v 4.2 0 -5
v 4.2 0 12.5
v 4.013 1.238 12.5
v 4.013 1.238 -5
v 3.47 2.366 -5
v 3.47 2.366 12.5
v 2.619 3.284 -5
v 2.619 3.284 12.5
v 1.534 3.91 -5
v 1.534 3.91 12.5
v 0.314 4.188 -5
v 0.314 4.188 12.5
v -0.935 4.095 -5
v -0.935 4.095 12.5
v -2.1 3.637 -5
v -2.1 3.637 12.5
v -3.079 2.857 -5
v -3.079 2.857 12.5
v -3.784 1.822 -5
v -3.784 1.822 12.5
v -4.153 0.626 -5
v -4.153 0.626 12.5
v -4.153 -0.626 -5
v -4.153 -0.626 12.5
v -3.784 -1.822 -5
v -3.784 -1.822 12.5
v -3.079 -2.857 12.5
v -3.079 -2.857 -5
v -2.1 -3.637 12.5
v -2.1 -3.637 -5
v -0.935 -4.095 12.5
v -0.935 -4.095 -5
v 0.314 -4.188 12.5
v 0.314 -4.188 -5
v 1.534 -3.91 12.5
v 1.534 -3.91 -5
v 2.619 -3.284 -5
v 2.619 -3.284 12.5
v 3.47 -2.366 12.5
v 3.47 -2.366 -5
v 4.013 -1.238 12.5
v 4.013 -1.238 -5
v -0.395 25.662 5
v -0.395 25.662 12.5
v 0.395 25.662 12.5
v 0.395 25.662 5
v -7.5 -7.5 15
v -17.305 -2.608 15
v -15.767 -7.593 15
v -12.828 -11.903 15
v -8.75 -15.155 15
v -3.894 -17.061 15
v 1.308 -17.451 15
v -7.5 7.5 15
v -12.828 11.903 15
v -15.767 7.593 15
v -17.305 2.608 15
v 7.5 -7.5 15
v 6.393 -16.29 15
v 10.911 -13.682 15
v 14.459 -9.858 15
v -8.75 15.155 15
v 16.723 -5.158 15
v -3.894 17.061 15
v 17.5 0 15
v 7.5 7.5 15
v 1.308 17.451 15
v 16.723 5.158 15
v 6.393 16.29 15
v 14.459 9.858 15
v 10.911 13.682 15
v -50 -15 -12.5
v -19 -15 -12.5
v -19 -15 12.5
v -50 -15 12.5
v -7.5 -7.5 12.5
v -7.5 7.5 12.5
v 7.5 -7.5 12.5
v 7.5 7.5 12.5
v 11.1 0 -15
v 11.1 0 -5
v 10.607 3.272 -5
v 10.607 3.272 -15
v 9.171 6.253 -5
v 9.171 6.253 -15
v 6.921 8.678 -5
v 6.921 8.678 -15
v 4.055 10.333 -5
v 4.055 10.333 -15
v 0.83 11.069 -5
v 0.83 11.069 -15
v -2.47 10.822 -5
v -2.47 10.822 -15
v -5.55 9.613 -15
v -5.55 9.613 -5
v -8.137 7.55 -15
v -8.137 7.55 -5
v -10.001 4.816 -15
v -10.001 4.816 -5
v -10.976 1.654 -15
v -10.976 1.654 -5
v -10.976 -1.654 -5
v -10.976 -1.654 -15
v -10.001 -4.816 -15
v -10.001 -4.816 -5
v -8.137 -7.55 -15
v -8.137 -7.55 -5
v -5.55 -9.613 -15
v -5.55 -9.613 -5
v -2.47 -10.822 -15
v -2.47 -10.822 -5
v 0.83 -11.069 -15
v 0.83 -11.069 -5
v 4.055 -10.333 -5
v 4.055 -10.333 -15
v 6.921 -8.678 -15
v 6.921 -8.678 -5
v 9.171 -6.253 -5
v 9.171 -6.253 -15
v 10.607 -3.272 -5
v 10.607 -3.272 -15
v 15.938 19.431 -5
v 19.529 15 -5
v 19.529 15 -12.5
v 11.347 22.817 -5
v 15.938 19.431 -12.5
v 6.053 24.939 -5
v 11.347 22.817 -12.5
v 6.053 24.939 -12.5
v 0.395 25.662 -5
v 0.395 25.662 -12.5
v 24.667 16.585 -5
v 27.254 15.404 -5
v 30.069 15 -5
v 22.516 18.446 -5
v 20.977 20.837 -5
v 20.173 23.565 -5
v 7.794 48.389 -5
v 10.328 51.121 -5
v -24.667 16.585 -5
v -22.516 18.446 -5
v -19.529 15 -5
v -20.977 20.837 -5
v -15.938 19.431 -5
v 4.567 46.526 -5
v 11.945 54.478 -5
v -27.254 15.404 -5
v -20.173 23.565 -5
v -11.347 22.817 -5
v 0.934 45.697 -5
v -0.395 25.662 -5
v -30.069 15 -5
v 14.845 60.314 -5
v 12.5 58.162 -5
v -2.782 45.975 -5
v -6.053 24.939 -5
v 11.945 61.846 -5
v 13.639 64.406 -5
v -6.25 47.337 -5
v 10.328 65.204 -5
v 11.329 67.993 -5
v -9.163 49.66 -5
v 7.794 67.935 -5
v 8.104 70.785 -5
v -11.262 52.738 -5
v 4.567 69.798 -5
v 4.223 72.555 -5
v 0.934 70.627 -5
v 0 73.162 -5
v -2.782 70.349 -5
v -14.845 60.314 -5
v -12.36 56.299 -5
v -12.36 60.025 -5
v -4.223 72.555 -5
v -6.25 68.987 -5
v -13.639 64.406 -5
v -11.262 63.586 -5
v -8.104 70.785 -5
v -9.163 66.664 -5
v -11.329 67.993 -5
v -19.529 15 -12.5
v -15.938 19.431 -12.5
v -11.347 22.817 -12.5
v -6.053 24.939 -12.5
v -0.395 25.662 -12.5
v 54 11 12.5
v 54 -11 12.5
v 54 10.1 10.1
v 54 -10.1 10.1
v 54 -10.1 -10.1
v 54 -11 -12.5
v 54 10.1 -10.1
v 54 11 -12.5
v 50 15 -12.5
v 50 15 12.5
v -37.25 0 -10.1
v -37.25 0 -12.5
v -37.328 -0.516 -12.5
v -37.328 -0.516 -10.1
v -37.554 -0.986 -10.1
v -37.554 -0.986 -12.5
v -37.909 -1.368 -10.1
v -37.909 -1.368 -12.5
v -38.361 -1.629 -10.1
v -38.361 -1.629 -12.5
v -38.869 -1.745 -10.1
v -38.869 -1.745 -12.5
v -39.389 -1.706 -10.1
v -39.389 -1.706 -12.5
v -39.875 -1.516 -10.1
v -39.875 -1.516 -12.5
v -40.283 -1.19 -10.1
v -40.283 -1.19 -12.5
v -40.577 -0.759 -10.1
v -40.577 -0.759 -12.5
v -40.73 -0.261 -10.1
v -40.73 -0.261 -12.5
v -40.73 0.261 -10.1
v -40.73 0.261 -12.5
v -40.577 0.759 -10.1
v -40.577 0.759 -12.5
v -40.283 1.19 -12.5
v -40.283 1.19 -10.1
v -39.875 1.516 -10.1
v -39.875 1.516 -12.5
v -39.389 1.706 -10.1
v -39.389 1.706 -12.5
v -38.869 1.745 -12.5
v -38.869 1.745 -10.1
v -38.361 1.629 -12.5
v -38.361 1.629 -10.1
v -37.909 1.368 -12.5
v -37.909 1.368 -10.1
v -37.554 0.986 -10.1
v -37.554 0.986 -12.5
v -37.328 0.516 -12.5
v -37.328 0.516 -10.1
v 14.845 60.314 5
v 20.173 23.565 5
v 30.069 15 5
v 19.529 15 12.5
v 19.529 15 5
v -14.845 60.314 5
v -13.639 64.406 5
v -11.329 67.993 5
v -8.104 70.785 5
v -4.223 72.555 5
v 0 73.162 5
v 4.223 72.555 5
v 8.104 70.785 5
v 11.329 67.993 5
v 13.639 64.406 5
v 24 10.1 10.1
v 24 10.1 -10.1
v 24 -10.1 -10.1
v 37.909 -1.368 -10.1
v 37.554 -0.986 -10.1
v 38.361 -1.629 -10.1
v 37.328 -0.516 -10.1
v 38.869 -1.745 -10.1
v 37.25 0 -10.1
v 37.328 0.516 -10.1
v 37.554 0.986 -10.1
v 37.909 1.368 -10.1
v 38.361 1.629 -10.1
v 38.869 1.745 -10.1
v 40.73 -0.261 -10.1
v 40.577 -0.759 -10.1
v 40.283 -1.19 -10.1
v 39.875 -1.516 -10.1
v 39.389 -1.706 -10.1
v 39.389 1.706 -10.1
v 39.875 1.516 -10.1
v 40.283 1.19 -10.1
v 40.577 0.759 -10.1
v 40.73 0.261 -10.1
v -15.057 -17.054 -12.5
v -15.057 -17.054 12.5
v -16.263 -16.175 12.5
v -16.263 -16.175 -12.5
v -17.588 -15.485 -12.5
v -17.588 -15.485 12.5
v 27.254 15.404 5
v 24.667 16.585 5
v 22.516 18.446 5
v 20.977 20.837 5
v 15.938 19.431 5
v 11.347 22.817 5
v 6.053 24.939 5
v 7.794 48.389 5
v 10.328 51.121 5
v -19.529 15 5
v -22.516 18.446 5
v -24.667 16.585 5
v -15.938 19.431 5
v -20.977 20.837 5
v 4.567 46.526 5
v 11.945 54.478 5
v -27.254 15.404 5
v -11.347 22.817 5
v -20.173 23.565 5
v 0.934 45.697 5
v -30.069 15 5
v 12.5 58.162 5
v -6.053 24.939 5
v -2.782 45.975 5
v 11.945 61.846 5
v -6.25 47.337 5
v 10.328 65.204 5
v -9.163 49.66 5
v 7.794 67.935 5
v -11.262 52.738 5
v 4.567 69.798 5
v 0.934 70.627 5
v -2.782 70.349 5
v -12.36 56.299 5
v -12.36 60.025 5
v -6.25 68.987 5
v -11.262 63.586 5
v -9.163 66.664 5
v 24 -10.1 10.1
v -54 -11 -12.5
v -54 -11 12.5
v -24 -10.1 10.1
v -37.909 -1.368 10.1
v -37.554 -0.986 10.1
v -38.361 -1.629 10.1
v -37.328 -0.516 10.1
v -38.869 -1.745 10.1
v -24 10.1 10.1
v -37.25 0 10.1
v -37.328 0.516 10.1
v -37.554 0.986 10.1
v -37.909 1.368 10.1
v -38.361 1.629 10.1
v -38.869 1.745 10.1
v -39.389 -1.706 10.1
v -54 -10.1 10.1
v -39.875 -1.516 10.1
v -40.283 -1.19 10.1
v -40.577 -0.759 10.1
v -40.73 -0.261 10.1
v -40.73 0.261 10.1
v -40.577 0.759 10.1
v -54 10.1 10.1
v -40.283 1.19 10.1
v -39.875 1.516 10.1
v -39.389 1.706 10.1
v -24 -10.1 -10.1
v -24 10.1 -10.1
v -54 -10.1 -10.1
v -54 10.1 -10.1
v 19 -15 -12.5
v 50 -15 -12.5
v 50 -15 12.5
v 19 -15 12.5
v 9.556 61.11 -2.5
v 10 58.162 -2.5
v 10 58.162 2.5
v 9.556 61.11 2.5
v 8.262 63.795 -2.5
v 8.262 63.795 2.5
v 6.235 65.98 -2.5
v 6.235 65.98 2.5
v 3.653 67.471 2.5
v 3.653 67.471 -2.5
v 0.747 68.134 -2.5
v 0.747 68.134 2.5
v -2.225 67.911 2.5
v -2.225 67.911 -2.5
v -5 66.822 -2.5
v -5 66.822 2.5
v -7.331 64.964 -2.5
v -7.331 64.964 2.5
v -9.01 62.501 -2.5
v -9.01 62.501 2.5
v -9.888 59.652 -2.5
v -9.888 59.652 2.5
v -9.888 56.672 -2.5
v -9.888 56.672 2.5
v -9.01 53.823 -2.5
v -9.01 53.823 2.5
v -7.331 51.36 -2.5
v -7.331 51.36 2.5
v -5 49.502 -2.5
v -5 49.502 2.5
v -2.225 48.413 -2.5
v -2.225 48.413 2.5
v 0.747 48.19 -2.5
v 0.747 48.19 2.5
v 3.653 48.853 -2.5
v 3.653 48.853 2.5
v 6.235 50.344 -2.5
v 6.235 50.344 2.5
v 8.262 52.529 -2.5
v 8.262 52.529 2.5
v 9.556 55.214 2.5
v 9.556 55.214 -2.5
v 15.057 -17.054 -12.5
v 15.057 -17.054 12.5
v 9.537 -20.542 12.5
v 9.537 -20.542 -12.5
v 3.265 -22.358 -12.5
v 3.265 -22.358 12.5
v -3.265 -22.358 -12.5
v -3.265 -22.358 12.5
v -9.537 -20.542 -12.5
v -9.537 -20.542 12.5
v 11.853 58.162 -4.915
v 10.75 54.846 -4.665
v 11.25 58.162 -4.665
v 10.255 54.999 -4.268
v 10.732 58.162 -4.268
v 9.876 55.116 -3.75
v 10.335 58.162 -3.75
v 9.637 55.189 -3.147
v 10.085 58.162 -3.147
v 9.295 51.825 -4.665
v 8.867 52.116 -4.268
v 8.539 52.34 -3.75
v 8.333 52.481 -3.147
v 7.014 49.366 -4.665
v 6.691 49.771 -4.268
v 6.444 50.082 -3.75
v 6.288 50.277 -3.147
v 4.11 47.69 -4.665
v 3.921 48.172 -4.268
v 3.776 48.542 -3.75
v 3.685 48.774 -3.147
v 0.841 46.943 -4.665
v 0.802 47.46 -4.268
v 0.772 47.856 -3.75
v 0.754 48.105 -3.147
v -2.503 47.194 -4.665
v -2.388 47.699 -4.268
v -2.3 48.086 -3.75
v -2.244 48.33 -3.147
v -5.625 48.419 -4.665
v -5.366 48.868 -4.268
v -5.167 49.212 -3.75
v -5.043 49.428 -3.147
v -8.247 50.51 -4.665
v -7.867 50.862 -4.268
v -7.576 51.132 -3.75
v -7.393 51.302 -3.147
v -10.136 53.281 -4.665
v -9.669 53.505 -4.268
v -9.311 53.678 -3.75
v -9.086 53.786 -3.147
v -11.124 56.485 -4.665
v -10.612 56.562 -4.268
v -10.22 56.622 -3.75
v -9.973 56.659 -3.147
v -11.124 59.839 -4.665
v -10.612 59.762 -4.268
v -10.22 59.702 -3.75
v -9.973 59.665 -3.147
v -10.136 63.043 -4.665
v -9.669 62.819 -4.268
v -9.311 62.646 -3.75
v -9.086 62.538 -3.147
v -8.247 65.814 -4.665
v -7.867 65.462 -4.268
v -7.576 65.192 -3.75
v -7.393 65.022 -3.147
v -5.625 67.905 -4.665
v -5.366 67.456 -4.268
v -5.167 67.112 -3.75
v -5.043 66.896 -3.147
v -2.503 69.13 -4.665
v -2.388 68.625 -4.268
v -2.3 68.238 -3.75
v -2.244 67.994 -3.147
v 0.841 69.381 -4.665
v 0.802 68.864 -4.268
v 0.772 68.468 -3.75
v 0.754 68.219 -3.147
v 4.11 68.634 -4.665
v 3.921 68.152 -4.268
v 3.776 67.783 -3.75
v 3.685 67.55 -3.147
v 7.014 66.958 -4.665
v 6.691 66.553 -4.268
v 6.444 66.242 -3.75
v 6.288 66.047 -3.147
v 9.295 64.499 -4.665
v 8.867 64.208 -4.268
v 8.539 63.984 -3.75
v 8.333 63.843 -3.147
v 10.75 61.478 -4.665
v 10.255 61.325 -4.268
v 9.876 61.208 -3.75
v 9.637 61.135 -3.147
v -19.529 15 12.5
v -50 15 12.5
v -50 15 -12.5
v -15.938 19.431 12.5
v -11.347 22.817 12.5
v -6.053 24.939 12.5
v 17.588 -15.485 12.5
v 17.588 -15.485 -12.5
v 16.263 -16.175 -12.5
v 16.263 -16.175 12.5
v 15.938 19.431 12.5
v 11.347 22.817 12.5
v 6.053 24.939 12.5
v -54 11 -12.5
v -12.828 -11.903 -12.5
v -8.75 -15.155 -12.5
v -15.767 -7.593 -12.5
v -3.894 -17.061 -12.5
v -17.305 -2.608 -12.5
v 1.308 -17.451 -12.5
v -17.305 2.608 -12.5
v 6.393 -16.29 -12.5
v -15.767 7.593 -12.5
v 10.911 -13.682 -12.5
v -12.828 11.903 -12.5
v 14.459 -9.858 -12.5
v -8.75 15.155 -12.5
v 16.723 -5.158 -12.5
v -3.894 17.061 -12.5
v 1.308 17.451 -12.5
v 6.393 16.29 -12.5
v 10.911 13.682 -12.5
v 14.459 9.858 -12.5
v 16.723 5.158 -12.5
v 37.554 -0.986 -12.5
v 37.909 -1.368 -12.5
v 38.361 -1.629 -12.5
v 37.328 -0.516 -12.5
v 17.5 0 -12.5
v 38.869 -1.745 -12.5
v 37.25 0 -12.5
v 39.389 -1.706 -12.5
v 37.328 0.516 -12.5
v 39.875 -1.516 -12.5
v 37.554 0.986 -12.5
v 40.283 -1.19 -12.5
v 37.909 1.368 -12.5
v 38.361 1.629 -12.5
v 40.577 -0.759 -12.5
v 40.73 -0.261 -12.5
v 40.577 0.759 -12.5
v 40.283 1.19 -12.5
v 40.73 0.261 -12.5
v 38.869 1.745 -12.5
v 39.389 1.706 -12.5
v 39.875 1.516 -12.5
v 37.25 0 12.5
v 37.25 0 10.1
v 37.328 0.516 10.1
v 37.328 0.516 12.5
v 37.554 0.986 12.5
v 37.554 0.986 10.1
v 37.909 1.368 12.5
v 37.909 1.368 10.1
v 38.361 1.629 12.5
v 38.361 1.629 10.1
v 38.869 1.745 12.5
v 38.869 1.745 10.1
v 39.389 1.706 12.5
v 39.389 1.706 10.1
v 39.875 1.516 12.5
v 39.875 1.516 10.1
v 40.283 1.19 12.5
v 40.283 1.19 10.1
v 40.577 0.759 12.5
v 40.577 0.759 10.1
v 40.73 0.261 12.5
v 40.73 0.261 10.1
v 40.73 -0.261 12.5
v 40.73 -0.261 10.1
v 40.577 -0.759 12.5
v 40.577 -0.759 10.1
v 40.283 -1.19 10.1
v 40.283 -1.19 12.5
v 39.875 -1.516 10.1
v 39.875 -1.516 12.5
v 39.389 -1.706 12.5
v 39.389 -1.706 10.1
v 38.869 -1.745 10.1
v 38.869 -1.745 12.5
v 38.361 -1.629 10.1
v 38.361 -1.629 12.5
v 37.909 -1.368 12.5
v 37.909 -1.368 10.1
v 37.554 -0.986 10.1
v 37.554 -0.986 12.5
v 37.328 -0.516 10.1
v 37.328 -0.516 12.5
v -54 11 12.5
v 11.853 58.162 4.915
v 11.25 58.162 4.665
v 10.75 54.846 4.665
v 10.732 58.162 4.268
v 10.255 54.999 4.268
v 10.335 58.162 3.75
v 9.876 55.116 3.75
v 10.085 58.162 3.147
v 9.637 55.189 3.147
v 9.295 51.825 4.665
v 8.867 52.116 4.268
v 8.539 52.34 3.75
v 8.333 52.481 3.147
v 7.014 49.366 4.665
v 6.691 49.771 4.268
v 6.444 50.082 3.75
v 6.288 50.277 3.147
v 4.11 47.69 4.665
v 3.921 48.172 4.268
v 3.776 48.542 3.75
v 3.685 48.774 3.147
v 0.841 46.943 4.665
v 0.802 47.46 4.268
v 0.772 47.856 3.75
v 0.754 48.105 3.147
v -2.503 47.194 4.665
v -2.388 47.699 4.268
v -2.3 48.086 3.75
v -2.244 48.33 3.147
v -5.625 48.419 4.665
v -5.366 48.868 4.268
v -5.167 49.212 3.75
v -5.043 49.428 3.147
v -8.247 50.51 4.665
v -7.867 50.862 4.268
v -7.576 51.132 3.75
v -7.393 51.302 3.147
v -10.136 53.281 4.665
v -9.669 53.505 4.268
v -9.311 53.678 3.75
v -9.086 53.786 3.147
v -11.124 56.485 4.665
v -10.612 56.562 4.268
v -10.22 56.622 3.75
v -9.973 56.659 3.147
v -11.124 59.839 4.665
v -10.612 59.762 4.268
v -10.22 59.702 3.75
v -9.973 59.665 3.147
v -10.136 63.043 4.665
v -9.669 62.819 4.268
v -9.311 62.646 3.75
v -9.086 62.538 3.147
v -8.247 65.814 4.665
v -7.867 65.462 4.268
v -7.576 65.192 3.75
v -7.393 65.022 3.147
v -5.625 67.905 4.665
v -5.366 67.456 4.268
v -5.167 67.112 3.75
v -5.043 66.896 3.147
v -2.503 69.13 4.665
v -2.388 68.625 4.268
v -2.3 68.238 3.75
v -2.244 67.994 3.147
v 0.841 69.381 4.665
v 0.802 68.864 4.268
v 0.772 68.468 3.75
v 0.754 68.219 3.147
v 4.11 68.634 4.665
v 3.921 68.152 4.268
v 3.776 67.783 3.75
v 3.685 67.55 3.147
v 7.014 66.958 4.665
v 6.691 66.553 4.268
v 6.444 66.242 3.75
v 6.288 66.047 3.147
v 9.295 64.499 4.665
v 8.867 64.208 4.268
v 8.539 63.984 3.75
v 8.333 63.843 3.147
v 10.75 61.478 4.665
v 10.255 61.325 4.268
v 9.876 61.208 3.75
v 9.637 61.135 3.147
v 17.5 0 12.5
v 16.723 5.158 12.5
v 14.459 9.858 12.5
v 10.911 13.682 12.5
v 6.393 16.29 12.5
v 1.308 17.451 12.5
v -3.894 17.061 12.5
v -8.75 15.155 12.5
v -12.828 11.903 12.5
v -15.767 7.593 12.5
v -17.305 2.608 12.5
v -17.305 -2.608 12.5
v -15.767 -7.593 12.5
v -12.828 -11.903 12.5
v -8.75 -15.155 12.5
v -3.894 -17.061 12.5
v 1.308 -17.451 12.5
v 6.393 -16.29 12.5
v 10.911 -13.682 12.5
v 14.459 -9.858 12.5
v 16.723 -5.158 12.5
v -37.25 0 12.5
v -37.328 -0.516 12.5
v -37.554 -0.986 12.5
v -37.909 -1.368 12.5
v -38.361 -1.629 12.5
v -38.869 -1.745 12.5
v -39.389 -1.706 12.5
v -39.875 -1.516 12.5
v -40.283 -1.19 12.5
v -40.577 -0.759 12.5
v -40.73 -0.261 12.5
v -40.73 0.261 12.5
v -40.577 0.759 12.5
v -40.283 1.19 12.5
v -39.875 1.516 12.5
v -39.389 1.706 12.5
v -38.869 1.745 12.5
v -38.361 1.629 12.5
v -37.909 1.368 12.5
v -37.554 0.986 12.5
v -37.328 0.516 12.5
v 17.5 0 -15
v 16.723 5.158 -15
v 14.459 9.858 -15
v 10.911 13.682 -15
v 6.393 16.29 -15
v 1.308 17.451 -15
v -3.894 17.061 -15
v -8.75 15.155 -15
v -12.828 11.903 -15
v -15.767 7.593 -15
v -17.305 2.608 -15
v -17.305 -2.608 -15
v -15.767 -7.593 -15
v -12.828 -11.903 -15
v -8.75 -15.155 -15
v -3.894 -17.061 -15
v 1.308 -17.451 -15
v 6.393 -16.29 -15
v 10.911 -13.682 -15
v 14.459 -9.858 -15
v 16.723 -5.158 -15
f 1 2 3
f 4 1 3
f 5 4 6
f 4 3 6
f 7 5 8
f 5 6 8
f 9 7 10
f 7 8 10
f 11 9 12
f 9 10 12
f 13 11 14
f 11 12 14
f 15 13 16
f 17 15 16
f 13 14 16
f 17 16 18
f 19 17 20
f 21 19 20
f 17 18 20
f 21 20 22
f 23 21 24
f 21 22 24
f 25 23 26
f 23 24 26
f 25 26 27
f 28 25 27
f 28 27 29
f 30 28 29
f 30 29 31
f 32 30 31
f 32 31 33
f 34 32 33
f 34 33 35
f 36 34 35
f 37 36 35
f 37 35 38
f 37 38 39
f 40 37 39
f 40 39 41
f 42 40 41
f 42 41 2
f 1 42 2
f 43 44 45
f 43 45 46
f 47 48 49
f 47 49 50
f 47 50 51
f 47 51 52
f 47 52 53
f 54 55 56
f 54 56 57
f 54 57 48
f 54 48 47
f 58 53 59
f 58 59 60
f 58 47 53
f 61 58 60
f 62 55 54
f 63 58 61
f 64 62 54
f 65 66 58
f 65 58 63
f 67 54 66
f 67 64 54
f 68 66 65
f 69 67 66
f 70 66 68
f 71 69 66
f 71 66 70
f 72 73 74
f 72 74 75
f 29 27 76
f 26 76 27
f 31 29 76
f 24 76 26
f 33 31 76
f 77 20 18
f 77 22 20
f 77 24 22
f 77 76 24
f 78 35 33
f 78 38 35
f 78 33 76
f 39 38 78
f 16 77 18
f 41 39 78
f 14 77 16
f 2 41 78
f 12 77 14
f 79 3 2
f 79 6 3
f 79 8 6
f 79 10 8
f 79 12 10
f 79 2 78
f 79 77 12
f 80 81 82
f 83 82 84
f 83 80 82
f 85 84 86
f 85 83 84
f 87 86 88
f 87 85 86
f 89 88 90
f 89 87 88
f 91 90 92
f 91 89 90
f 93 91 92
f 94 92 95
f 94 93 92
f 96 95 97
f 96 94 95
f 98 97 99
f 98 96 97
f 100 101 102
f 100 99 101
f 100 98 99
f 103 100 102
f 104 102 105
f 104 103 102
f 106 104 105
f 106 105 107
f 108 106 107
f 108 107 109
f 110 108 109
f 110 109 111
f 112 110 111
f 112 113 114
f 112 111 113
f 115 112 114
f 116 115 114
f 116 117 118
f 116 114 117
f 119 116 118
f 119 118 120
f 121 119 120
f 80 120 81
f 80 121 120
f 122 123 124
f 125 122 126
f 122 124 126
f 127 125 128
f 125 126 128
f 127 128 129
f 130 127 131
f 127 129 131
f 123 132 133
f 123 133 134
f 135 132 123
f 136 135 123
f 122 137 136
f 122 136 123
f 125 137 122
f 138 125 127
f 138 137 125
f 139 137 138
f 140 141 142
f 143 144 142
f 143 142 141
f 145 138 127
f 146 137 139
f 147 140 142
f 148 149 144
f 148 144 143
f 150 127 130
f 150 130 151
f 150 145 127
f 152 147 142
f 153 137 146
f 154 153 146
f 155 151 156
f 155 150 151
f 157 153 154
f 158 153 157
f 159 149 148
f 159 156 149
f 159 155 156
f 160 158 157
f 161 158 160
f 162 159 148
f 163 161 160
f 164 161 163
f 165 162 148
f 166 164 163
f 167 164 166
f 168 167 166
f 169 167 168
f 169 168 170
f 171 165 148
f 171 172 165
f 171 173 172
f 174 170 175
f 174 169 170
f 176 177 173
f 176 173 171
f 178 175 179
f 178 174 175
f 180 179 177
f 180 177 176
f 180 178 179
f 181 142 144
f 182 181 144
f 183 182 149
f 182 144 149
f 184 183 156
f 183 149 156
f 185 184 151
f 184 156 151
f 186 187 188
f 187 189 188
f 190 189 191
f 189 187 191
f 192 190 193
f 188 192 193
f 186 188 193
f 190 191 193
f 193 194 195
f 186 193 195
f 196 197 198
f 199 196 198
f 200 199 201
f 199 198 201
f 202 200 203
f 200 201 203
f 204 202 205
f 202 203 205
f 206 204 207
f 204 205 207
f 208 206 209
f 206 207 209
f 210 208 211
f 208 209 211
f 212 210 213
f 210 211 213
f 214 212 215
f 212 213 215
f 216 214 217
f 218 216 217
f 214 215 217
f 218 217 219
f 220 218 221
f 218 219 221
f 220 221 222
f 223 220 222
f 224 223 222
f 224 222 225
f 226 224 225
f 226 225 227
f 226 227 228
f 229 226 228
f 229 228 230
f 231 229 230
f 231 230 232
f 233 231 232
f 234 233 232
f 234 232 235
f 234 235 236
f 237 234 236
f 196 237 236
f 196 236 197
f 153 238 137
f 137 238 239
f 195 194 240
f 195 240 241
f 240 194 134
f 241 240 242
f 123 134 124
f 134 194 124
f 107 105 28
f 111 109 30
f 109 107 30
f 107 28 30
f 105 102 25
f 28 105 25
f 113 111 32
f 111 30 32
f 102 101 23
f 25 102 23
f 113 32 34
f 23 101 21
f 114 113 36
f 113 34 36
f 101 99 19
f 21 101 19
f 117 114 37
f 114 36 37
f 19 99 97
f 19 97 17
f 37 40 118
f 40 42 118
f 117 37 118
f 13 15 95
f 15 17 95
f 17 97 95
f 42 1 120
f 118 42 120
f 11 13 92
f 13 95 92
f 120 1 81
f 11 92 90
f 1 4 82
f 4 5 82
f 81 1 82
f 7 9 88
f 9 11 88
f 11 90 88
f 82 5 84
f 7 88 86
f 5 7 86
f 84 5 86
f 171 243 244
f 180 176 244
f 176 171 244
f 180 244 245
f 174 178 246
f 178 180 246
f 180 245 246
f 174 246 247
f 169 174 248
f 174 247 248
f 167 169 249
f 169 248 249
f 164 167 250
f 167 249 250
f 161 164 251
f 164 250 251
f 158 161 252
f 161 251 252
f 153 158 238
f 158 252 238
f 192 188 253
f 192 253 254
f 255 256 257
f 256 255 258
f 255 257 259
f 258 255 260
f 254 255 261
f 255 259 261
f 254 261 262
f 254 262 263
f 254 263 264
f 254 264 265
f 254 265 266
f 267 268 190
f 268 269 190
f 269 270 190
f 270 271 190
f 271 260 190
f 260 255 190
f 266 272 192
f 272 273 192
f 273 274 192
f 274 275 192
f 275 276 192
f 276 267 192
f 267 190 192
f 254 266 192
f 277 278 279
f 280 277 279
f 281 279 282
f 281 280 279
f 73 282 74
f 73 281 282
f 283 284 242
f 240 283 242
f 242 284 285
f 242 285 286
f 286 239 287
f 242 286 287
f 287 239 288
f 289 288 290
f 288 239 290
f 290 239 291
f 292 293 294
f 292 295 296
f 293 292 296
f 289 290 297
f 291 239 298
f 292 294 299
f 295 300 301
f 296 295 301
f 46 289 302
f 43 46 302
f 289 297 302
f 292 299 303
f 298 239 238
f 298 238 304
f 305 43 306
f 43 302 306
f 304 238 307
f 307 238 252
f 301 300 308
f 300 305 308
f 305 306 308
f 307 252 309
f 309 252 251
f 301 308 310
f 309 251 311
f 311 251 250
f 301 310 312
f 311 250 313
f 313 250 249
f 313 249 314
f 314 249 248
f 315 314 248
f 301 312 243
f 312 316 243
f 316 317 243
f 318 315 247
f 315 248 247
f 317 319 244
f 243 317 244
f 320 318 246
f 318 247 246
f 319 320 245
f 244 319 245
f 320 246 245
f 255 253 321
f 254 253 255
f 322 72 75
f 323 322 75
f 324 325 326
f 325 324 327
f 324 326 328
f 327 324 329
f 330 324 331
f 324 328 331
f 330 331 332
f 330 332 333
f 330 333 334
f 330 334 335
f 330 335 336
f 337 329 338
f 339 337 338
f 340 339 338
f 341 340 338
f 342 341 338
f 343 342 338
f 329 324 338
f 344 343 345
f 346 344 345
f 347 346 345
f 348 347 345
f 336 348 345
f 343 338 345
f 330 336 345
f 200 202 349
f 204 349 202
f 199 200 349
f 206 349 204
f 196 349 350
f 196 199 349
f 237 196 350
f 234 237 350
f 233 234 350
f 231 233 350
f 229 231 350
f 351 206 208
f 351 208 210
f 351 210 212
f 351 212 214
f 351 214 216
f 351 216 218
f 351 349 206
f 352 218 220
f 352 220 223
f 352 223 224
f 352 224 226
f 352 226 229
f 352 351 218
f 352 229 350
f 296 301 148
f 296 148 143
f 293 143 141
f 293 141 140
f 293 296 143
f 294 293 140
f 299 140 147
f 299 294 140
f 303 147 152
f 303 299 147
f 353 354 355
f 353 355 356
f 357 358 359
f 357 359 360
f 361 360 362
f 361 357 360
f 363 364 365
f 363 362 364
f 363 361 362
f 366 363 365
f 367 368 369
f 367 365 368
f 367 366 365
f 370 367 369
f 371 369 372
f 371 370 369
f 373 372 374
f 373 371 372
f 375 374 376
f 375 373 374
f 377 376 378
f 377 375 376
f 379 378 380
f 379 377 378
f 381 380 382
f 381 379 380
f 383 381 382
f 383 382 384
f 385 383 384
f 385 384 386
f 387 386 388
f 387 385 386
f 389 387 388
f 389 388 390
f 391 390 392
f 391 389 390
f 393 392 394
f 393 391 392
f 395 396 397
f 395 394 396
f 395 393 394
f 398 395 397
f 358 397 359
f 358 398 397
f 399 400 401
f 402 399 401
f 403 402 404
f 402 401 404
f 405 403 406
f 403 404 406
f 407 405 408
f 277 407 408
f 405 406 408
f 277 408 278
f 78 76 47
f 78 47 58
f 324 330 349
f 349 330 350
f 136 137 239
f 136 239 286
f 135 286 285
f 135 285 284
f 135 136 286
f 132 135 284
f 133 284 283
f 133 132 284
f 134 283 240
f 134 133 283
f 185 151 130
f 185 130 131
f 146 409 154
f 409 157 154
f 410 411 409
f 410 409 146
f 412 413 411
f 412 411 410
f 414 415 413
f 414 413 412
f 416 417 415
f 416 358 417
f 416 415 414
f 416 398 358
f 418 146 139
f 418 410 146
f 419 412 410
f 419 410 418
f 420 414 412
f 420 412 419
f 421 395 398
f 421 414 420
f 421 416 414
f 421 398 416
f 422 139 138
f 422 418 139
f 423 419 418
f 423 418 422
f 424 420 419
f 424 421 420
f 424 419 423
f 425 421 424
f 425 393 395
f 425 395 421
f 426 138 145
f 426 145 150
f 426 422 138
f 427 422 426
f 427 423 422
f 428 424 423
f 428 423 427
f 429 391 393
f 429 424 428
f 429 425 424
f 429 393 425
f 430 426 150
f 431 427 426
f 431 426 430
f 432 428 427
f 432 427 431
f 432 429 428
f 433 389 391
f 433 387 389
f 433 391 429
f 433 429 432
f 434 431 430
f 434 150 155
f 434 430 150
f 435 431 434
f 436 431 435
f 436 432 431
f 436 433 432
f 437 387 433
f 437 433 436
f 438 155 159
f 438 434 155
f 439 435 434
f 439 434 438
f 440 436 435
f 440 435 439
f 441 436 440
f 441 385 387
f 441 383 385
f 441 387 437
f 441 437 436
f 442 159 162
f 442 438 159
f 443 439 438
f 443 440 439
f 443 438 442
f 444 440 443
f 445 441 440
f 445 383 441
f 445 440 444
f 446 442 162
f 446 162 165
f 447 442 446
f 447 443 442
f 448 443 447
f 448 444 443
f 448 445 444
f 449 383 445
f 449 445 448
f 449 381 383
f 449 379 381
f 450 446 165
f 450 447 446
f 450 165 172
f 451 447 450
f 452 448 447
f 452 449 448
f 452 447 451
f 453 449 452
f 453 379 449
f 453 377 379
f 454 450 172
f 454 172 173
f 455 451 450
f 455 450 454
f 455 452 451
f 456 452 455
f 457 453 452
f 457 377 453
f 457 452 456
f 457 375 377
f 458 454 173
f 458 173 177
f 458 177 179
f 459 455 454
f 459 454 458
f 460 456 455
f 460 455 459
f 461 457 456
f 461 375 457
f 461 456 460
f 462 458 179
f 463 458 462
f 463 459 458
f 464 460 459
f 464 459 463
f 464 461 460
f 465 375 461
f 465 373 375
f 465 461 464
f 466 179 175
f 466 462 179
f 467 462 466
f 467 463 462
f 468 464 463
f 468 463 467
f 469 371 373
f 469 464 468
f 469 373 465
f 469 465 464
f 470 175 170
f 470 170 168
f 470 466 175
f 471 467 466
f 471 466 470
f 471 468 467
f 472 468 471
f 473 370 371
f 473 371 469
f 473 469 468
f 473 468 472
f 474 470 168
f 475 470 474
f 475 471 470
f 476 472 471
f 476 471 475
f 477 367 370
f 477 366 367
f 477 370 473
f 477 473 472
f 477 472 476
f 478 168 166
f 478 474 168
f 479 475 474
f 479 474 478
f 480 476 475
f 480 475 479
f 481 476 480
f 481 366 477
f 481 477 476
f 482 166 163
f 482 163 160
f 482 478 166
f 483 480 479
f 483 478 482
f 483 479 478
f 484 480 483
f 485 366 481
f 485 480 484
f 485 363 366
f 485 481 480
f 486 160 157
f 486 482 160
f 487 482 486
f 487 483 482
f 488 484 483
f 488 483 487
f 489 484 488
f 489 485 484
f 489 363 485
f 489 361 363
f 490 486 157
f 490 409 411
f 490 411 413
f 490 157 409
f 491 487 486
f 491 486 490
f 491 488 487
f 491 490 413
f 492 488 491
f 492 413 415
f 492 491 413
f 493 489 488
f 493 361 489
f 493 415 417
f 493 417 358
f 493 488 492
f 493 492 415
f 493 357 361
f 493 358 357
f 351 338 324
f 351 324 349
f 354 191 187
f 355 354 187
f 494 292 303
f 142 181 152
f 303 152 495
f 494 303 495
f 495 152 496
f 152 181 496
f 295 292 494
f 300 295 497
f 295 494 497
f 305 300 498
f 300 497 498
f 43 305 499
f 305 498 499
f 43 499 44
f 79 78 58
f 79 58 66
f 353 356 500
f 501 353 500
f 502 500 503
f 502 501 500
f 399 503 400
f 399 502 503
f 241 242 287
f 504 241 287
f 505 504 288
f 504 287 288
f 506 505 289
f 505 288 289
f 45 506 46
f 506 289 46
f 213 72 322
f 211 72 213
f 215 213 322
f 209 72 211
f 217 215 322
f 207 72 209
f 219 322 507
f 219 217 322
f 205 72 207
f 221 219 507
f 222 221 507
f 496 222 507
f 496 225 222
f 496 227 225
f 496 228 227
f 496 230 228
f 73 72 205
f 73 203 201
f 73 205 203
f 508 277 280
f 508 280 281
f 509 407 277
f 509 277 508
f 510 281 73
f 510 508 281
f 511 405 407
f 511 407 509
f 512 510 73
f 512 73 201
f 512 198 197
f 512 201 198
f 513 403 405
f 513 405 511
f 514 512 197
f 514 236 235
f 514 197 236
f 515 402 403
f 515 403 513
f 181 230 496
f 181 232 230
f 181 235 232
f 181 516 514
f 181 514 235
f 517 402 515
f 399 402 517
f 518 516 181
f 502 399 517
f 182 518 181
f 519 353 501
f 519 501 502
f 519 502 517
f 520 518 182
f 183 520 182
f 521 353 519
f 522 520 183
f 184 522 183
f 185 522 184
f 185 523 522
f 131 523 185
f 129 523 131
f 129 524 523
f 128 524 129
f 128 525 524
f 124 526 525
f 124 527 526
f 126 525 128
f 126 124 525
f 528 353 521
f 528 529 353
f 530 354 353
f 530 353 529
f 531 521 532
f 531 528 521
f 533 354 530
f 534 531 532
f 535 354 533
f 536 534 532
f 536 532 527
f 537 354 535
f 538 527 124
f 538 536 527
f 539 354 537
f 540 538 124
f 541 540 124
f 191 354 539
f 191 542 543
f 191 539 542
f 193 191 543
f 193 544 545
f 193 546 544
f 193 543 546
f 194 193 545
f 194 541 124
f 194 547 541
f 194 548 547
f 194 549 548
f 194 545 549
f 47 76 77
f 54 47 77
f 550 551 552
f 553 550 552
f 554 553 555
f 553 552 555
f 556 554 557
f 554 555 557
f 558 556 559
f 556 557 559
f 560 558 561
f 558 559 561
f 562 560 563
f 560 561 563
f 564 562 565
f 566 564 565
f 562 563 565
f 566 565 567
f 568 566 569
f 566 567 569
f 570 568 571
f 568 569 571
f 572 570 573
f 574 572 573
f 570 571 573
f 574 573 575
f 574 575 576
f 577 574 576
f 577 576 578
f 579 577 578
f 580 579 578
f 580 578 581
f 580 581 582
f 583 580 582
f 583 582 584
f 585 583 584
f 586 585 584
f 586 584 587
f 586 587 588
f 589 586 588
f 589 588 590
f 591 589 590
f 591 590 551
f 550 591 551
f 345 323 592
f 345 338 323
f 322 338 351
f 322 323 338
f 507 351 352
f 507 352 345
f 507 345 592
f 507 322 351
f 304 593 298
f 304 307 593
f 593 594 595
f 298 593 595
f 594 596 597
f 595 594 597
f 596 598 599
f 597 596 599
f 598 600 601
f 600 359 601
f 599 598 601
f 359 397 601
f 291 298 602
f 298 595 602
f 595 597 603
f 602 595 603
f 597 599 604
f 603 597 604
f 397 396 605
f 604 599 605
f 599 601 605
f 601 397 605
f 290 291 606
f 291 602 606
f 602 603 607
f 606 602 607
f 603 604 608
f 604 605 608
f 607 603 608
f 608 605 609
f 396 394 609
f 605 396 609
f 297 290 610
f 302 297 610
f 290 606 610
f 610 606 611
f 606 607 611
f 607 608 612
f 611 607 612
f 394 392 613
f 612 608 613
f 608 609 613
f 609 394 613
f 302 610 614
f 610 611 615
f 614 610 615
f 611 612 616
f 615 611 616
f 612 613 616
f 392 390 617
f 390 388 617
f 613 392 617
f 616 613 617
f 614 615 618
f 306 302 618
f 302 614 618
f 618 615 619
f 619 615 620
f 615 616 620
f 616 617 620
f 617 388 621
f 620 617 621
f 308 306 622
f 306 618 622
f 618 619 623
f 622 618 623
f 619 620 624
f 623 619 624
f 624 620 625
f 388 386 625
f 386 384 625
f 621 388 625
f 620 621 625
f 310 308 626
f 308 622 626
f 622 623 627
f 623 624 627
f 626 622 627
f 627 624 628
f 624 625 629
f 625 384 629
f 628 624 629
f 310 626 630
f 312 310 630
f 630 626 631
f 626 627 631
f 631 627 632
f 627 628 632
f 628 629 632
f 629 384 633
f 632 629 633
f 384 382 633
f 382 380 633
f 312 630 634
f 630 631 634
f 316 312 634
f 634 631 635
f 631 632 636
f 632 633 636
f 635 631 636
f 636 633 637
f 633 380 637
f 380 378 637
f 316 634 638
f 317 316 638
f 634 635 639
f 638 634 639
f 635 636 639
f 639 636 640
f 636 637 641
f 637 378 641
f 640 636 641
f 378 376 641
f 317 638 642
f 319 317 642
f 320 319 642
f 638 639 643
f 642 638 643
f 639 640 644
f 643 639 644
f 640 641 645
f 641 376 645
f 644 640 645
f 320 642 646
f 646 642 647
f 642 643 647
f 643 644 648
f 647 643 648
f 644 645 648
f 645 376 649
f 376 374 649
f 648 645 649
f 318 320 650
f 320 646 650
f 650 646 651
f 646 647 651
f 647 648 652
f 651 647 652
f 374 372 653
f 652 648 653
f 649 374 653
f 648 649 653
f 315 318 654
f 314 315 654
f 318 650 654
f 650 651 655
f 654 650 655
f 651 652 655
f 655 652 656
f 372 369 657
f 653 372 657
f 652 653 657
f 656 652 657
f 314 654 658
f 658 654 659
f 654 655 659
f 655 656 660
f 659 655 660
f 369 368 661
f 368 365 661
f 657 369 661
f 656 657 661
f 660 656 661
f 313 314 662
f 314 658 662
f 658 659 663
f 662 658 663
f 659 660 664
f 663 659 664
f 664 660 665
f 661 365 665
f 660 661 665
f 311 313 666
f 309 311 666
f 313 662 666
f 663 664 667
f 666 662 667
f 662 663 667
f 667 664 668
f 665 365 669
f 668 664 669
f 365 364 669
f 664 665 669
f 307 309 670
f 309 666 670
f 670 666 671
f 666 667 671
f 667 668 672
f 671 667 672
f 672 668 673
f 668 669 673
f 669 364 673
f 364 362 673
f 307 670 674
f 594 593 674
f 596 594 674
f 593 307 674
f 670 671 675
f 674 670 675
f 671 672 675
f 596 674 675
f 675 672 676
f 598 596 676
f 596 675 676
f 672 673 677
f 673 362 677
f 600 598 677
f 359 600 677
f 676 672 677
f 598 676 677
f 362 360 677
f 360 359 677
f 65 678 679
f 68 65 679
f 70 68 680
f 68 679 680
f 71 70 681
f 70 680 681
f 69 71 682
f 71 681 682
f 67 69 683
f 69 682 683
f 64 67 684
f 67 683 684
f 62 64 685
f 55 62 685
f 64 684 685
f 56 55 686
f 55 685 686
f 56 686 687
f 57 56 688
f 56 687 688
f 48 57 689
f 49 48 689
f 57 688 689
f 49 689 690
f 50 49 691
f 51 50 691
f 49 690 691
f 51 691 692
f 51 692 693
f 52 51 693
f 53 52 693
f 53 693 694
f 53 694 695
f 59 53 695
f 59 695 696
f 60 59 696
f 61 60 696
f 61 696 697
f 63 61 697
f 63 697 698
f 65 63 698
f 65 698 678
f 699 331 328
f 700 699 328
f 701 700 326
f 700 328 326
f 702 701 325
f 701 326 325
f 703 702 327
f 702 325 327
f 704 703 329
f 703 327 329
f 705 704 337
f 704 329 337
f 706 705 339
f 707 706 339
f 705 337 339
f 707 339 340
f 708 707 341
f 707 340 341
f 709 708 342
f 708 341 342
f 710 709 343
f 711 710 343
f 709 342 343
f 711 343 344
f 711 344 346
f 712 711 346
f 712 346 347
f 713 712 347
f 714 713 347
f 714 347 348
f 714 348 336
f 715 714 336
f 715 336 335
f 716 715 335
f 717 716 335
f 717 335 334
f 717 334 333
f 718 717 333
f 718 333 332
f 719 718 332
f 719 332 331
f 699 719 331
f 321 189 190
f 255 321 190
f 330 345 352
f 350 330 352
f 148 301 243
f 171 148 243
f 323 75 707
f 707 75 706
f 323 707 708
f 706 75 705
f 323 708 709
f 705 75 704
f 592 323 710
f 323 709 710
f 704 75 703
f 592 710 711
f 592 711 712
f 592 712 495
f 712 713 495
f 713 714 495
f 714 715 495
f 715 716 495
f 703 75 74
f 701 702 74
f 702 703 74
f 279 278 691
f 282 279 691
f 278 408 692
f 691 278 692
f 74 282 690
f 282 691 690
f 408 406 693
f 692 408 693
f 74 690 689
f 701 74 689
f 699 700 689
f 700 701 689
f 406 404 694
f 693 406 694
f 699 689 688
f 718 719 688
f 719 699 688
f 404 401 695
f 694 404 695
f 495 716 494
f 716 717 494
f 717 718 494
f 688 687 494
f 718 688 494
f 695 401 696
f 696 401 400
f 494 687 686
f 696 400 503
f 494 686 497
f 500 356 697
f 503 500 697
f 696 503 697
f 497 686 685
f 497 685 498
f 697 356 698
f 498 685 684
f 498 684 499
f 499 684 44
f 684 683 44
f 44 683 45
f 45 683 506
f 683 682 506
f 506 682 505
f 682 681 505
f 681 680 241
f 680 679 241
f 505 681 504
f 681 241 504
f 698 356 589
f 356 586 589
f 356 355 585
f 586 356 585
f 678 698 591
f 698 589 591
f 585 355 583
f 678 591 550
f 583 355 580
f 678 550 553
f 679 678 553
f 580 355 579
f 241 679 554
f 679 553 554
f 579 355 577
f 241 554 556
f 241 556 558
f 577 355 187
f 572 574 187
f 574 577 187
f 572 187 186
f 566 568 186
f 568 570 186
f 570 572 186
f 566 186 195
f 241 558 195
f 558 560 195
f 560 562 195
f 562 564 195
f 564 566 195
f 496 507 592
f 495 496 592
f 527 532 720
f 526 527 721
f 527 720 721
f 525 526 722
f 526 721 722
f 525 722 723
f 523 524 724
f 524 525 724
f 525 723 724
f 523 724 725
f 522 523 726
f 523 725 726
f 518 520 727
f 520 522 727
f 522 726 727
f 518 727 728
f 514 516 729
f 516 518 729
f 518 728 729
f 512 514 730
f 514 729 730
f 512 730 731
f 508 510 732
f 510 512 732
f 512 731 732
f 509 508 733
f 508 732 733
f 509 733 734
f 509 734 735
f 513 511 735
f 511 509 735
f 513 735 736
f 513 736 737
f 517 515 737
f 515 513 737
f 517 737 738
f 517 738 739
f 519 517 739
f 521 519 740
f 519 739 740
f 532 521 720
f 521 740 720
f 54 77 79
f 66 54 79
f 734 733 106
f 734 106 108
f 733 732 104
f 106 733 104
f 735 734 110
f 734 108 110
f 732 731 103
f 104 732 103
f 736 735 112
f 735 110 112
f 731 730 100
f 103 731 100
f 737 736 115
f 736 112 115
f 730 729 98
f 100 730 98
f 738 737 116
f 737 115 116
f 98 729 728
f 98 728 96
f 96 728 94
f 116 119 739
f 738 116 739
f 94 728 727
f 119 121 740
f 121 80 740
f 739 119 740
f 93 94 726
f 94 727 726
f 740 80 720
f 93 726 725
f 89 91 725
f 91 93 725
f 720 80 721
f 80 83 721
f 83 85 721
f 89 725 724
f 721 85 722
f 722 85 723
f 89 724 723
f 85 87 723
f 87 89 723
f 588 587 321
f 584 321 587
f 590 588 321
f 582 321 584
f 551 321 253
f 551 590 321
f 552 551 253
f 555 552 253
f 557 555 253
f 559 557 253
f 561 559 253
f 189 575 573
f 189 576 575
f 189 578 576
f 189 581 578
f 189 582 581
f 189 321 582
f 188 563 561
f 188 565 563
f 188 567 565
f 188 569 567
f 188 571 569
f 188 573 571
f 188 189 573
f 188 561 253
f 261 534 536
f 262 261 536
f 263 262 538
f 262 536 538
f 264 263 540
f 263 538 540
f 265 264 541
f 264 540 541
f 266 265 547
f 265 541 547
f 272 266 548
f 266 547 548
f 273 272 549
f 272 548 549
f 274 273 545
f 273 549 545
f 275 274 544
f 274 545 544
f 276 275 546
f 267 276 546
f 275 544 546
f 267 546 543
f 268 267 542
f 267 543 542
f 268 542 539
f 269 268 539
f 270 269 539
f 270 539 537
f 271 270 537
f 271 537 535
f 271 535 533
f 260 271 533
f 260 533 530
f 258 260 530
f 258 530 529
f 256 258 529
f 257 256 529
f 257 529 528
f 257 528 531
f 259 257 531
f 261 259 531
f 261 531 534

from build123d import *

# Parameters (mm, degrees)
CROQUIS1_R                   = 15
CROQUIS1_R_2                 = 10
SALIENTE_EXTRUIR1_DEPTH      = 12.5
CORTAR_EXTRUIR2_DEPTH        = 78.778499901
CORTAR_EXTRUIR2_DEPTH_BACK   = 78.778499901
CROQUIS3_W                   = 7.5
CROQUIS3_H                   = 47.5
REDONDEO3_R                  = 22.5
CROQUIS4_W                   = 35
CROQUIS4_H                   = 30
CROQUIS4_R                   = 1.75
SALIENTE_EXTRUIR2_DEPTH      = 25
CROQUIS5_W                   = 20.2
CROQUIS5_H                   = 20.2
CORTAR_EXTRUIR3_DEPTH        = 30
REDONDEO4_R                  = 10
CHAFL_N1_SIZE                = 4
REDONDEO6_R                  = 2.5
SALIENTE_EXTRUIR3_DEPTH      = 2.5
SALIENTE_EXTRUIR3_DEPTH_BACK = 27.5
CROQUIS6_R                   = 17.5
CROQUIS6_R_2                 = 11.1
CROQUIS8_R                   = 17.5
CROQUIS8_R_2                 = 4.2
SALIENTE_EXTRUIR4_DEPTH      = 20
CORTAR_EXTRUIR4_DEPTH        = 96.753237788
CORTAR_EXTRUIR4_DEPTH_BACK   = 2.5
CROQUIS9_W                   = 15
CROQUIS9_H                   = 15
CROQUIS9_R                   = 4.2


with BuildPart() as part:
    # Croquis1 → Saliente-Extruir1 (new, symmetric)
    with BuildSketch(Plane.XY):
        with BuildLine():
            Line((-23.009443154, 3.997898972), (-14.844802035, 60.31420332))
            ThreePointArc((-14.844802035, 60.31420332), (0, 73.162029407), (14.844802035, 60.31420332))
            Line((14.844802035, 60.31420332), (23.009443154, 3.997898972))
            ThreePointArc((23.009443154, 3.997898972), (0, -22.587970593), (-23.009443154, 3.997898972))
        make_face()
        Circle(CROQUIS1_R, mode=Mode.SUBTRACT)
        with Locations((0, 58.162029407)):
            Circle(CROQUIS1_R_2, mode=Mode.SUBTRACT)
    extrude(amount=SALIENTE_EXTRUIR1_DEPTH, both=True)

    # Croquis3 → Cortar-Extruir2 (cut, two sides: drawn at the far end of the back side and taken through both)
    with BuildSketch(Plane(origin=(0, 0, 0), x_dir=(0, 0, -1), z_dir=(1, 0, 0)).offset(-CORTAR_EXTRUIR2_DEPTH_BACK)):
        with Locations((8.75, 49.412029407)):
            Rectangle(CROQUIS3_W, CROQUIS3_H)
        with Locations((-8.75, 49.412029407)):
            Rectangle(CROQUIS3_W, CROQUIS3_H)
    extrude(amount=CORTAR_EXTRUIR2_DEPTH + CORTAR_EXTRUIR2_DEPTH_BACK, mode=Mode.SUBTRACT)

    # Redondeo3
    redondeo3_edges = [part.edges().sort_by_distance(p)[0] for p in [
        (-19.868614717, 25.662029407, 8.75),
        (-19.868614717, 25.662029407, -8.75),
        (19.868614717, 25.662029407, -8.75),
        (19.868614717, 25.662029407, 8.75),
    ]]
    fillet(redondeo3_edges, radius=REDONDEO3_R)

    # Croquis4 → Saliente-Extruir2 (add)
    # profile 1 of 2: a face of its own
    with BuildSketch(Plane(origin=(0, 0, -12.5), x_dir=(-1, 0, 0), z_dir=(0, 0, -1))):
        with Locations((-36.5, 0)):
            Rectangle(CROQUIS4_W, CROQUIS4_H)
        with Locations((-39, 0)):
            Circle(CROQUIS4_R, mode=Mode.SUBTRACT)
    # profile 2 of 2: a face of its own
    with BuildSketch(Plane(origin=(0, 0, -12.5), x_dir=(-1, 0, 0), z_dir=(0, 0, -1))):
        with Locations((36.5, 0)):
            Rectangle(CROQUIS4_W, CROQUIS4_H)
        with Locations(Location((39, 0, 0), (0, 0, 180))):
            Circle(CROQUIS4_R, mode=Mode.SUBTRACT)
    extrude(amount=-SALIENTE_EXTRUIR2_DEPTH)

    # Croquis5 → Cortar-Extruir3 (cut)
    with BuildSketch(Plane(origin=(54, 0, 0), x_dir=(0, 0, -1), z_dir=(1, 0, 0))):
        Rectangle(CROQUIS5_W, CROQUIS5_H)
    cortar_extruir3 = extrude(amount=-CORTAR_EXTRUIR3_DEPTH, mode=Mode.SUBTRACT)

    # Simetría1: Cortar-Extruir3 across plane
    add(cortar_extruir3.mirror(Plane(origin=(0, 0, 0), x_dir=(0, 0, 1), z_dir=(1, 0, 0))), mode=Mode.SUBTRACT)

    # Redondeo4
    # the kernel refuses this fillet: 10 mm, written as the material it adds along each edge
    with BuildSketch(Plane(origin=(-19, -12.738063876, -12.5), x_dir=(0.674519649650932, -0.7382568944715545, 0), z_dir=(0, 0, 1))) as redondeo4_piece_1:
        with BuildLine():
            CenterArc((7.103598198, -9.920648267), REDONDEO4_R, 97.222764243, 25.690637502)
            Line((1.669889938, -1.525720362), (0, 0))
            ThreePointArc((0, 0), (2.92316209, -0.184492778), (5.846324181, 0))
        make_face()
    extrude(amount=25)
    with BuildSketch(Plane(origin=(19, -12.738063876, -12.5), x_dir=(0, -1, 0), z_dir=(0, 0, 1))) as redondeo4_piece_2:
        with BuildLine():
            CenterArc((11.935952539, 2.532470413), REDONDEO4_R, 194.669738911, 25.690637502)
            ThreePointArc((4.316089134, -3.943460538), (2.282488571, -1.835527204), (0, 0))
            Line((0, 0), (2.261936124, 0))
        make_face()
    extrude(amount=25)
    with BuildSketch(Plane(origin=(21.414377435, 15, -5), x_dir=(1, 0, 0), z_dir=(0, 0, 1)), Plane(origin=(-21.414377435, 15, 5), x_dir=(-1, 0, 0), z_dir=(0, 0, -1))) as redondeo4_piece_3:
        with BuildLine():
            CenterArc((REDONDEO4_R * 0.865476417736, REDONDEO4_R), REDONDEO4_R, 188.249168565, 81.750831435)
            Line((-REDONDEO4_R * 0.12417705124, REDONDEO4_R * 0.85652173913), (0, 0))
            Line((0, 0), (REDONDEO4_R * 0.865476417736, 0))
        make_face()
    extrude(amount=10)

    # Chaflán1
    chafl_n1_edges = [part.edges().sort_by_distance(p)[0] for p in [
        (-54, 15, 0),
        (-54, -15, 0),
        (54, -15, 0),
        (54, 15, 0),
    ]]
    chamfer(chafl_n1_edges, length=CHAFL_N1_SIZE)

    # Redondeo6
    redondeo6_edges = [part.edges().sort_by_distance(p)[0] for p in [
        (-10, 58.162029407, -5),
        (-10, 58.162029407, 5),
    ]]
    fillet(redondeo6_edges, radius=REDONDEO6_R)

    # Croquis6 → Saliente-Extruir3 (add, two sides: drawn at the far end of the back side and taken through both)
    with BuildSketch(Plane.XY.offset(12.5).offset(-SALIENTE_EXTRUIR3_DEPTH_BACK)):
        Circle(CROQUIS6_R)
        Circle(CROQUIS6_R_2, mode=Mode.SUBTRACT)
    extrude(amount=SALIENTE_EXTRUIR3_DEPTH + SALIENTE_EXTRUIR3_DEPTH_BACK)

    # Croquis8 → Saliente-Extruir4 (add)
    with BuildSketch(Plane.XY.offset(15)):
        Circle(CROQUIS8_R)
        Circle(CROQUIS8_R_2, mode=Mode.SUBTRACT)
    extrude(amount=-SALIENTE_EXTRUIR4_DEPTH)

    # Croquis9 → Cortar-Extruir4 (cut, two sides: drawn at the far end of the back side and taken through both)
    with BuildSketch(Plane.XY.offset(15).offset(-CORTAR_EXTRUIR4_DEPTH_BACK)):
        Rectangle(CROQUIS9_W, CROQUIS9_H)
        Circle(CROQUIS9_R, mode=Mode.SUBTRACT)
    extrude(amount=CORTAR_EXTRUIR4_DEPTH + CORTAR_EXTRUIR4_DEPTH_BACK, mode=Mode.SUBTRACT)


solid = part.part
